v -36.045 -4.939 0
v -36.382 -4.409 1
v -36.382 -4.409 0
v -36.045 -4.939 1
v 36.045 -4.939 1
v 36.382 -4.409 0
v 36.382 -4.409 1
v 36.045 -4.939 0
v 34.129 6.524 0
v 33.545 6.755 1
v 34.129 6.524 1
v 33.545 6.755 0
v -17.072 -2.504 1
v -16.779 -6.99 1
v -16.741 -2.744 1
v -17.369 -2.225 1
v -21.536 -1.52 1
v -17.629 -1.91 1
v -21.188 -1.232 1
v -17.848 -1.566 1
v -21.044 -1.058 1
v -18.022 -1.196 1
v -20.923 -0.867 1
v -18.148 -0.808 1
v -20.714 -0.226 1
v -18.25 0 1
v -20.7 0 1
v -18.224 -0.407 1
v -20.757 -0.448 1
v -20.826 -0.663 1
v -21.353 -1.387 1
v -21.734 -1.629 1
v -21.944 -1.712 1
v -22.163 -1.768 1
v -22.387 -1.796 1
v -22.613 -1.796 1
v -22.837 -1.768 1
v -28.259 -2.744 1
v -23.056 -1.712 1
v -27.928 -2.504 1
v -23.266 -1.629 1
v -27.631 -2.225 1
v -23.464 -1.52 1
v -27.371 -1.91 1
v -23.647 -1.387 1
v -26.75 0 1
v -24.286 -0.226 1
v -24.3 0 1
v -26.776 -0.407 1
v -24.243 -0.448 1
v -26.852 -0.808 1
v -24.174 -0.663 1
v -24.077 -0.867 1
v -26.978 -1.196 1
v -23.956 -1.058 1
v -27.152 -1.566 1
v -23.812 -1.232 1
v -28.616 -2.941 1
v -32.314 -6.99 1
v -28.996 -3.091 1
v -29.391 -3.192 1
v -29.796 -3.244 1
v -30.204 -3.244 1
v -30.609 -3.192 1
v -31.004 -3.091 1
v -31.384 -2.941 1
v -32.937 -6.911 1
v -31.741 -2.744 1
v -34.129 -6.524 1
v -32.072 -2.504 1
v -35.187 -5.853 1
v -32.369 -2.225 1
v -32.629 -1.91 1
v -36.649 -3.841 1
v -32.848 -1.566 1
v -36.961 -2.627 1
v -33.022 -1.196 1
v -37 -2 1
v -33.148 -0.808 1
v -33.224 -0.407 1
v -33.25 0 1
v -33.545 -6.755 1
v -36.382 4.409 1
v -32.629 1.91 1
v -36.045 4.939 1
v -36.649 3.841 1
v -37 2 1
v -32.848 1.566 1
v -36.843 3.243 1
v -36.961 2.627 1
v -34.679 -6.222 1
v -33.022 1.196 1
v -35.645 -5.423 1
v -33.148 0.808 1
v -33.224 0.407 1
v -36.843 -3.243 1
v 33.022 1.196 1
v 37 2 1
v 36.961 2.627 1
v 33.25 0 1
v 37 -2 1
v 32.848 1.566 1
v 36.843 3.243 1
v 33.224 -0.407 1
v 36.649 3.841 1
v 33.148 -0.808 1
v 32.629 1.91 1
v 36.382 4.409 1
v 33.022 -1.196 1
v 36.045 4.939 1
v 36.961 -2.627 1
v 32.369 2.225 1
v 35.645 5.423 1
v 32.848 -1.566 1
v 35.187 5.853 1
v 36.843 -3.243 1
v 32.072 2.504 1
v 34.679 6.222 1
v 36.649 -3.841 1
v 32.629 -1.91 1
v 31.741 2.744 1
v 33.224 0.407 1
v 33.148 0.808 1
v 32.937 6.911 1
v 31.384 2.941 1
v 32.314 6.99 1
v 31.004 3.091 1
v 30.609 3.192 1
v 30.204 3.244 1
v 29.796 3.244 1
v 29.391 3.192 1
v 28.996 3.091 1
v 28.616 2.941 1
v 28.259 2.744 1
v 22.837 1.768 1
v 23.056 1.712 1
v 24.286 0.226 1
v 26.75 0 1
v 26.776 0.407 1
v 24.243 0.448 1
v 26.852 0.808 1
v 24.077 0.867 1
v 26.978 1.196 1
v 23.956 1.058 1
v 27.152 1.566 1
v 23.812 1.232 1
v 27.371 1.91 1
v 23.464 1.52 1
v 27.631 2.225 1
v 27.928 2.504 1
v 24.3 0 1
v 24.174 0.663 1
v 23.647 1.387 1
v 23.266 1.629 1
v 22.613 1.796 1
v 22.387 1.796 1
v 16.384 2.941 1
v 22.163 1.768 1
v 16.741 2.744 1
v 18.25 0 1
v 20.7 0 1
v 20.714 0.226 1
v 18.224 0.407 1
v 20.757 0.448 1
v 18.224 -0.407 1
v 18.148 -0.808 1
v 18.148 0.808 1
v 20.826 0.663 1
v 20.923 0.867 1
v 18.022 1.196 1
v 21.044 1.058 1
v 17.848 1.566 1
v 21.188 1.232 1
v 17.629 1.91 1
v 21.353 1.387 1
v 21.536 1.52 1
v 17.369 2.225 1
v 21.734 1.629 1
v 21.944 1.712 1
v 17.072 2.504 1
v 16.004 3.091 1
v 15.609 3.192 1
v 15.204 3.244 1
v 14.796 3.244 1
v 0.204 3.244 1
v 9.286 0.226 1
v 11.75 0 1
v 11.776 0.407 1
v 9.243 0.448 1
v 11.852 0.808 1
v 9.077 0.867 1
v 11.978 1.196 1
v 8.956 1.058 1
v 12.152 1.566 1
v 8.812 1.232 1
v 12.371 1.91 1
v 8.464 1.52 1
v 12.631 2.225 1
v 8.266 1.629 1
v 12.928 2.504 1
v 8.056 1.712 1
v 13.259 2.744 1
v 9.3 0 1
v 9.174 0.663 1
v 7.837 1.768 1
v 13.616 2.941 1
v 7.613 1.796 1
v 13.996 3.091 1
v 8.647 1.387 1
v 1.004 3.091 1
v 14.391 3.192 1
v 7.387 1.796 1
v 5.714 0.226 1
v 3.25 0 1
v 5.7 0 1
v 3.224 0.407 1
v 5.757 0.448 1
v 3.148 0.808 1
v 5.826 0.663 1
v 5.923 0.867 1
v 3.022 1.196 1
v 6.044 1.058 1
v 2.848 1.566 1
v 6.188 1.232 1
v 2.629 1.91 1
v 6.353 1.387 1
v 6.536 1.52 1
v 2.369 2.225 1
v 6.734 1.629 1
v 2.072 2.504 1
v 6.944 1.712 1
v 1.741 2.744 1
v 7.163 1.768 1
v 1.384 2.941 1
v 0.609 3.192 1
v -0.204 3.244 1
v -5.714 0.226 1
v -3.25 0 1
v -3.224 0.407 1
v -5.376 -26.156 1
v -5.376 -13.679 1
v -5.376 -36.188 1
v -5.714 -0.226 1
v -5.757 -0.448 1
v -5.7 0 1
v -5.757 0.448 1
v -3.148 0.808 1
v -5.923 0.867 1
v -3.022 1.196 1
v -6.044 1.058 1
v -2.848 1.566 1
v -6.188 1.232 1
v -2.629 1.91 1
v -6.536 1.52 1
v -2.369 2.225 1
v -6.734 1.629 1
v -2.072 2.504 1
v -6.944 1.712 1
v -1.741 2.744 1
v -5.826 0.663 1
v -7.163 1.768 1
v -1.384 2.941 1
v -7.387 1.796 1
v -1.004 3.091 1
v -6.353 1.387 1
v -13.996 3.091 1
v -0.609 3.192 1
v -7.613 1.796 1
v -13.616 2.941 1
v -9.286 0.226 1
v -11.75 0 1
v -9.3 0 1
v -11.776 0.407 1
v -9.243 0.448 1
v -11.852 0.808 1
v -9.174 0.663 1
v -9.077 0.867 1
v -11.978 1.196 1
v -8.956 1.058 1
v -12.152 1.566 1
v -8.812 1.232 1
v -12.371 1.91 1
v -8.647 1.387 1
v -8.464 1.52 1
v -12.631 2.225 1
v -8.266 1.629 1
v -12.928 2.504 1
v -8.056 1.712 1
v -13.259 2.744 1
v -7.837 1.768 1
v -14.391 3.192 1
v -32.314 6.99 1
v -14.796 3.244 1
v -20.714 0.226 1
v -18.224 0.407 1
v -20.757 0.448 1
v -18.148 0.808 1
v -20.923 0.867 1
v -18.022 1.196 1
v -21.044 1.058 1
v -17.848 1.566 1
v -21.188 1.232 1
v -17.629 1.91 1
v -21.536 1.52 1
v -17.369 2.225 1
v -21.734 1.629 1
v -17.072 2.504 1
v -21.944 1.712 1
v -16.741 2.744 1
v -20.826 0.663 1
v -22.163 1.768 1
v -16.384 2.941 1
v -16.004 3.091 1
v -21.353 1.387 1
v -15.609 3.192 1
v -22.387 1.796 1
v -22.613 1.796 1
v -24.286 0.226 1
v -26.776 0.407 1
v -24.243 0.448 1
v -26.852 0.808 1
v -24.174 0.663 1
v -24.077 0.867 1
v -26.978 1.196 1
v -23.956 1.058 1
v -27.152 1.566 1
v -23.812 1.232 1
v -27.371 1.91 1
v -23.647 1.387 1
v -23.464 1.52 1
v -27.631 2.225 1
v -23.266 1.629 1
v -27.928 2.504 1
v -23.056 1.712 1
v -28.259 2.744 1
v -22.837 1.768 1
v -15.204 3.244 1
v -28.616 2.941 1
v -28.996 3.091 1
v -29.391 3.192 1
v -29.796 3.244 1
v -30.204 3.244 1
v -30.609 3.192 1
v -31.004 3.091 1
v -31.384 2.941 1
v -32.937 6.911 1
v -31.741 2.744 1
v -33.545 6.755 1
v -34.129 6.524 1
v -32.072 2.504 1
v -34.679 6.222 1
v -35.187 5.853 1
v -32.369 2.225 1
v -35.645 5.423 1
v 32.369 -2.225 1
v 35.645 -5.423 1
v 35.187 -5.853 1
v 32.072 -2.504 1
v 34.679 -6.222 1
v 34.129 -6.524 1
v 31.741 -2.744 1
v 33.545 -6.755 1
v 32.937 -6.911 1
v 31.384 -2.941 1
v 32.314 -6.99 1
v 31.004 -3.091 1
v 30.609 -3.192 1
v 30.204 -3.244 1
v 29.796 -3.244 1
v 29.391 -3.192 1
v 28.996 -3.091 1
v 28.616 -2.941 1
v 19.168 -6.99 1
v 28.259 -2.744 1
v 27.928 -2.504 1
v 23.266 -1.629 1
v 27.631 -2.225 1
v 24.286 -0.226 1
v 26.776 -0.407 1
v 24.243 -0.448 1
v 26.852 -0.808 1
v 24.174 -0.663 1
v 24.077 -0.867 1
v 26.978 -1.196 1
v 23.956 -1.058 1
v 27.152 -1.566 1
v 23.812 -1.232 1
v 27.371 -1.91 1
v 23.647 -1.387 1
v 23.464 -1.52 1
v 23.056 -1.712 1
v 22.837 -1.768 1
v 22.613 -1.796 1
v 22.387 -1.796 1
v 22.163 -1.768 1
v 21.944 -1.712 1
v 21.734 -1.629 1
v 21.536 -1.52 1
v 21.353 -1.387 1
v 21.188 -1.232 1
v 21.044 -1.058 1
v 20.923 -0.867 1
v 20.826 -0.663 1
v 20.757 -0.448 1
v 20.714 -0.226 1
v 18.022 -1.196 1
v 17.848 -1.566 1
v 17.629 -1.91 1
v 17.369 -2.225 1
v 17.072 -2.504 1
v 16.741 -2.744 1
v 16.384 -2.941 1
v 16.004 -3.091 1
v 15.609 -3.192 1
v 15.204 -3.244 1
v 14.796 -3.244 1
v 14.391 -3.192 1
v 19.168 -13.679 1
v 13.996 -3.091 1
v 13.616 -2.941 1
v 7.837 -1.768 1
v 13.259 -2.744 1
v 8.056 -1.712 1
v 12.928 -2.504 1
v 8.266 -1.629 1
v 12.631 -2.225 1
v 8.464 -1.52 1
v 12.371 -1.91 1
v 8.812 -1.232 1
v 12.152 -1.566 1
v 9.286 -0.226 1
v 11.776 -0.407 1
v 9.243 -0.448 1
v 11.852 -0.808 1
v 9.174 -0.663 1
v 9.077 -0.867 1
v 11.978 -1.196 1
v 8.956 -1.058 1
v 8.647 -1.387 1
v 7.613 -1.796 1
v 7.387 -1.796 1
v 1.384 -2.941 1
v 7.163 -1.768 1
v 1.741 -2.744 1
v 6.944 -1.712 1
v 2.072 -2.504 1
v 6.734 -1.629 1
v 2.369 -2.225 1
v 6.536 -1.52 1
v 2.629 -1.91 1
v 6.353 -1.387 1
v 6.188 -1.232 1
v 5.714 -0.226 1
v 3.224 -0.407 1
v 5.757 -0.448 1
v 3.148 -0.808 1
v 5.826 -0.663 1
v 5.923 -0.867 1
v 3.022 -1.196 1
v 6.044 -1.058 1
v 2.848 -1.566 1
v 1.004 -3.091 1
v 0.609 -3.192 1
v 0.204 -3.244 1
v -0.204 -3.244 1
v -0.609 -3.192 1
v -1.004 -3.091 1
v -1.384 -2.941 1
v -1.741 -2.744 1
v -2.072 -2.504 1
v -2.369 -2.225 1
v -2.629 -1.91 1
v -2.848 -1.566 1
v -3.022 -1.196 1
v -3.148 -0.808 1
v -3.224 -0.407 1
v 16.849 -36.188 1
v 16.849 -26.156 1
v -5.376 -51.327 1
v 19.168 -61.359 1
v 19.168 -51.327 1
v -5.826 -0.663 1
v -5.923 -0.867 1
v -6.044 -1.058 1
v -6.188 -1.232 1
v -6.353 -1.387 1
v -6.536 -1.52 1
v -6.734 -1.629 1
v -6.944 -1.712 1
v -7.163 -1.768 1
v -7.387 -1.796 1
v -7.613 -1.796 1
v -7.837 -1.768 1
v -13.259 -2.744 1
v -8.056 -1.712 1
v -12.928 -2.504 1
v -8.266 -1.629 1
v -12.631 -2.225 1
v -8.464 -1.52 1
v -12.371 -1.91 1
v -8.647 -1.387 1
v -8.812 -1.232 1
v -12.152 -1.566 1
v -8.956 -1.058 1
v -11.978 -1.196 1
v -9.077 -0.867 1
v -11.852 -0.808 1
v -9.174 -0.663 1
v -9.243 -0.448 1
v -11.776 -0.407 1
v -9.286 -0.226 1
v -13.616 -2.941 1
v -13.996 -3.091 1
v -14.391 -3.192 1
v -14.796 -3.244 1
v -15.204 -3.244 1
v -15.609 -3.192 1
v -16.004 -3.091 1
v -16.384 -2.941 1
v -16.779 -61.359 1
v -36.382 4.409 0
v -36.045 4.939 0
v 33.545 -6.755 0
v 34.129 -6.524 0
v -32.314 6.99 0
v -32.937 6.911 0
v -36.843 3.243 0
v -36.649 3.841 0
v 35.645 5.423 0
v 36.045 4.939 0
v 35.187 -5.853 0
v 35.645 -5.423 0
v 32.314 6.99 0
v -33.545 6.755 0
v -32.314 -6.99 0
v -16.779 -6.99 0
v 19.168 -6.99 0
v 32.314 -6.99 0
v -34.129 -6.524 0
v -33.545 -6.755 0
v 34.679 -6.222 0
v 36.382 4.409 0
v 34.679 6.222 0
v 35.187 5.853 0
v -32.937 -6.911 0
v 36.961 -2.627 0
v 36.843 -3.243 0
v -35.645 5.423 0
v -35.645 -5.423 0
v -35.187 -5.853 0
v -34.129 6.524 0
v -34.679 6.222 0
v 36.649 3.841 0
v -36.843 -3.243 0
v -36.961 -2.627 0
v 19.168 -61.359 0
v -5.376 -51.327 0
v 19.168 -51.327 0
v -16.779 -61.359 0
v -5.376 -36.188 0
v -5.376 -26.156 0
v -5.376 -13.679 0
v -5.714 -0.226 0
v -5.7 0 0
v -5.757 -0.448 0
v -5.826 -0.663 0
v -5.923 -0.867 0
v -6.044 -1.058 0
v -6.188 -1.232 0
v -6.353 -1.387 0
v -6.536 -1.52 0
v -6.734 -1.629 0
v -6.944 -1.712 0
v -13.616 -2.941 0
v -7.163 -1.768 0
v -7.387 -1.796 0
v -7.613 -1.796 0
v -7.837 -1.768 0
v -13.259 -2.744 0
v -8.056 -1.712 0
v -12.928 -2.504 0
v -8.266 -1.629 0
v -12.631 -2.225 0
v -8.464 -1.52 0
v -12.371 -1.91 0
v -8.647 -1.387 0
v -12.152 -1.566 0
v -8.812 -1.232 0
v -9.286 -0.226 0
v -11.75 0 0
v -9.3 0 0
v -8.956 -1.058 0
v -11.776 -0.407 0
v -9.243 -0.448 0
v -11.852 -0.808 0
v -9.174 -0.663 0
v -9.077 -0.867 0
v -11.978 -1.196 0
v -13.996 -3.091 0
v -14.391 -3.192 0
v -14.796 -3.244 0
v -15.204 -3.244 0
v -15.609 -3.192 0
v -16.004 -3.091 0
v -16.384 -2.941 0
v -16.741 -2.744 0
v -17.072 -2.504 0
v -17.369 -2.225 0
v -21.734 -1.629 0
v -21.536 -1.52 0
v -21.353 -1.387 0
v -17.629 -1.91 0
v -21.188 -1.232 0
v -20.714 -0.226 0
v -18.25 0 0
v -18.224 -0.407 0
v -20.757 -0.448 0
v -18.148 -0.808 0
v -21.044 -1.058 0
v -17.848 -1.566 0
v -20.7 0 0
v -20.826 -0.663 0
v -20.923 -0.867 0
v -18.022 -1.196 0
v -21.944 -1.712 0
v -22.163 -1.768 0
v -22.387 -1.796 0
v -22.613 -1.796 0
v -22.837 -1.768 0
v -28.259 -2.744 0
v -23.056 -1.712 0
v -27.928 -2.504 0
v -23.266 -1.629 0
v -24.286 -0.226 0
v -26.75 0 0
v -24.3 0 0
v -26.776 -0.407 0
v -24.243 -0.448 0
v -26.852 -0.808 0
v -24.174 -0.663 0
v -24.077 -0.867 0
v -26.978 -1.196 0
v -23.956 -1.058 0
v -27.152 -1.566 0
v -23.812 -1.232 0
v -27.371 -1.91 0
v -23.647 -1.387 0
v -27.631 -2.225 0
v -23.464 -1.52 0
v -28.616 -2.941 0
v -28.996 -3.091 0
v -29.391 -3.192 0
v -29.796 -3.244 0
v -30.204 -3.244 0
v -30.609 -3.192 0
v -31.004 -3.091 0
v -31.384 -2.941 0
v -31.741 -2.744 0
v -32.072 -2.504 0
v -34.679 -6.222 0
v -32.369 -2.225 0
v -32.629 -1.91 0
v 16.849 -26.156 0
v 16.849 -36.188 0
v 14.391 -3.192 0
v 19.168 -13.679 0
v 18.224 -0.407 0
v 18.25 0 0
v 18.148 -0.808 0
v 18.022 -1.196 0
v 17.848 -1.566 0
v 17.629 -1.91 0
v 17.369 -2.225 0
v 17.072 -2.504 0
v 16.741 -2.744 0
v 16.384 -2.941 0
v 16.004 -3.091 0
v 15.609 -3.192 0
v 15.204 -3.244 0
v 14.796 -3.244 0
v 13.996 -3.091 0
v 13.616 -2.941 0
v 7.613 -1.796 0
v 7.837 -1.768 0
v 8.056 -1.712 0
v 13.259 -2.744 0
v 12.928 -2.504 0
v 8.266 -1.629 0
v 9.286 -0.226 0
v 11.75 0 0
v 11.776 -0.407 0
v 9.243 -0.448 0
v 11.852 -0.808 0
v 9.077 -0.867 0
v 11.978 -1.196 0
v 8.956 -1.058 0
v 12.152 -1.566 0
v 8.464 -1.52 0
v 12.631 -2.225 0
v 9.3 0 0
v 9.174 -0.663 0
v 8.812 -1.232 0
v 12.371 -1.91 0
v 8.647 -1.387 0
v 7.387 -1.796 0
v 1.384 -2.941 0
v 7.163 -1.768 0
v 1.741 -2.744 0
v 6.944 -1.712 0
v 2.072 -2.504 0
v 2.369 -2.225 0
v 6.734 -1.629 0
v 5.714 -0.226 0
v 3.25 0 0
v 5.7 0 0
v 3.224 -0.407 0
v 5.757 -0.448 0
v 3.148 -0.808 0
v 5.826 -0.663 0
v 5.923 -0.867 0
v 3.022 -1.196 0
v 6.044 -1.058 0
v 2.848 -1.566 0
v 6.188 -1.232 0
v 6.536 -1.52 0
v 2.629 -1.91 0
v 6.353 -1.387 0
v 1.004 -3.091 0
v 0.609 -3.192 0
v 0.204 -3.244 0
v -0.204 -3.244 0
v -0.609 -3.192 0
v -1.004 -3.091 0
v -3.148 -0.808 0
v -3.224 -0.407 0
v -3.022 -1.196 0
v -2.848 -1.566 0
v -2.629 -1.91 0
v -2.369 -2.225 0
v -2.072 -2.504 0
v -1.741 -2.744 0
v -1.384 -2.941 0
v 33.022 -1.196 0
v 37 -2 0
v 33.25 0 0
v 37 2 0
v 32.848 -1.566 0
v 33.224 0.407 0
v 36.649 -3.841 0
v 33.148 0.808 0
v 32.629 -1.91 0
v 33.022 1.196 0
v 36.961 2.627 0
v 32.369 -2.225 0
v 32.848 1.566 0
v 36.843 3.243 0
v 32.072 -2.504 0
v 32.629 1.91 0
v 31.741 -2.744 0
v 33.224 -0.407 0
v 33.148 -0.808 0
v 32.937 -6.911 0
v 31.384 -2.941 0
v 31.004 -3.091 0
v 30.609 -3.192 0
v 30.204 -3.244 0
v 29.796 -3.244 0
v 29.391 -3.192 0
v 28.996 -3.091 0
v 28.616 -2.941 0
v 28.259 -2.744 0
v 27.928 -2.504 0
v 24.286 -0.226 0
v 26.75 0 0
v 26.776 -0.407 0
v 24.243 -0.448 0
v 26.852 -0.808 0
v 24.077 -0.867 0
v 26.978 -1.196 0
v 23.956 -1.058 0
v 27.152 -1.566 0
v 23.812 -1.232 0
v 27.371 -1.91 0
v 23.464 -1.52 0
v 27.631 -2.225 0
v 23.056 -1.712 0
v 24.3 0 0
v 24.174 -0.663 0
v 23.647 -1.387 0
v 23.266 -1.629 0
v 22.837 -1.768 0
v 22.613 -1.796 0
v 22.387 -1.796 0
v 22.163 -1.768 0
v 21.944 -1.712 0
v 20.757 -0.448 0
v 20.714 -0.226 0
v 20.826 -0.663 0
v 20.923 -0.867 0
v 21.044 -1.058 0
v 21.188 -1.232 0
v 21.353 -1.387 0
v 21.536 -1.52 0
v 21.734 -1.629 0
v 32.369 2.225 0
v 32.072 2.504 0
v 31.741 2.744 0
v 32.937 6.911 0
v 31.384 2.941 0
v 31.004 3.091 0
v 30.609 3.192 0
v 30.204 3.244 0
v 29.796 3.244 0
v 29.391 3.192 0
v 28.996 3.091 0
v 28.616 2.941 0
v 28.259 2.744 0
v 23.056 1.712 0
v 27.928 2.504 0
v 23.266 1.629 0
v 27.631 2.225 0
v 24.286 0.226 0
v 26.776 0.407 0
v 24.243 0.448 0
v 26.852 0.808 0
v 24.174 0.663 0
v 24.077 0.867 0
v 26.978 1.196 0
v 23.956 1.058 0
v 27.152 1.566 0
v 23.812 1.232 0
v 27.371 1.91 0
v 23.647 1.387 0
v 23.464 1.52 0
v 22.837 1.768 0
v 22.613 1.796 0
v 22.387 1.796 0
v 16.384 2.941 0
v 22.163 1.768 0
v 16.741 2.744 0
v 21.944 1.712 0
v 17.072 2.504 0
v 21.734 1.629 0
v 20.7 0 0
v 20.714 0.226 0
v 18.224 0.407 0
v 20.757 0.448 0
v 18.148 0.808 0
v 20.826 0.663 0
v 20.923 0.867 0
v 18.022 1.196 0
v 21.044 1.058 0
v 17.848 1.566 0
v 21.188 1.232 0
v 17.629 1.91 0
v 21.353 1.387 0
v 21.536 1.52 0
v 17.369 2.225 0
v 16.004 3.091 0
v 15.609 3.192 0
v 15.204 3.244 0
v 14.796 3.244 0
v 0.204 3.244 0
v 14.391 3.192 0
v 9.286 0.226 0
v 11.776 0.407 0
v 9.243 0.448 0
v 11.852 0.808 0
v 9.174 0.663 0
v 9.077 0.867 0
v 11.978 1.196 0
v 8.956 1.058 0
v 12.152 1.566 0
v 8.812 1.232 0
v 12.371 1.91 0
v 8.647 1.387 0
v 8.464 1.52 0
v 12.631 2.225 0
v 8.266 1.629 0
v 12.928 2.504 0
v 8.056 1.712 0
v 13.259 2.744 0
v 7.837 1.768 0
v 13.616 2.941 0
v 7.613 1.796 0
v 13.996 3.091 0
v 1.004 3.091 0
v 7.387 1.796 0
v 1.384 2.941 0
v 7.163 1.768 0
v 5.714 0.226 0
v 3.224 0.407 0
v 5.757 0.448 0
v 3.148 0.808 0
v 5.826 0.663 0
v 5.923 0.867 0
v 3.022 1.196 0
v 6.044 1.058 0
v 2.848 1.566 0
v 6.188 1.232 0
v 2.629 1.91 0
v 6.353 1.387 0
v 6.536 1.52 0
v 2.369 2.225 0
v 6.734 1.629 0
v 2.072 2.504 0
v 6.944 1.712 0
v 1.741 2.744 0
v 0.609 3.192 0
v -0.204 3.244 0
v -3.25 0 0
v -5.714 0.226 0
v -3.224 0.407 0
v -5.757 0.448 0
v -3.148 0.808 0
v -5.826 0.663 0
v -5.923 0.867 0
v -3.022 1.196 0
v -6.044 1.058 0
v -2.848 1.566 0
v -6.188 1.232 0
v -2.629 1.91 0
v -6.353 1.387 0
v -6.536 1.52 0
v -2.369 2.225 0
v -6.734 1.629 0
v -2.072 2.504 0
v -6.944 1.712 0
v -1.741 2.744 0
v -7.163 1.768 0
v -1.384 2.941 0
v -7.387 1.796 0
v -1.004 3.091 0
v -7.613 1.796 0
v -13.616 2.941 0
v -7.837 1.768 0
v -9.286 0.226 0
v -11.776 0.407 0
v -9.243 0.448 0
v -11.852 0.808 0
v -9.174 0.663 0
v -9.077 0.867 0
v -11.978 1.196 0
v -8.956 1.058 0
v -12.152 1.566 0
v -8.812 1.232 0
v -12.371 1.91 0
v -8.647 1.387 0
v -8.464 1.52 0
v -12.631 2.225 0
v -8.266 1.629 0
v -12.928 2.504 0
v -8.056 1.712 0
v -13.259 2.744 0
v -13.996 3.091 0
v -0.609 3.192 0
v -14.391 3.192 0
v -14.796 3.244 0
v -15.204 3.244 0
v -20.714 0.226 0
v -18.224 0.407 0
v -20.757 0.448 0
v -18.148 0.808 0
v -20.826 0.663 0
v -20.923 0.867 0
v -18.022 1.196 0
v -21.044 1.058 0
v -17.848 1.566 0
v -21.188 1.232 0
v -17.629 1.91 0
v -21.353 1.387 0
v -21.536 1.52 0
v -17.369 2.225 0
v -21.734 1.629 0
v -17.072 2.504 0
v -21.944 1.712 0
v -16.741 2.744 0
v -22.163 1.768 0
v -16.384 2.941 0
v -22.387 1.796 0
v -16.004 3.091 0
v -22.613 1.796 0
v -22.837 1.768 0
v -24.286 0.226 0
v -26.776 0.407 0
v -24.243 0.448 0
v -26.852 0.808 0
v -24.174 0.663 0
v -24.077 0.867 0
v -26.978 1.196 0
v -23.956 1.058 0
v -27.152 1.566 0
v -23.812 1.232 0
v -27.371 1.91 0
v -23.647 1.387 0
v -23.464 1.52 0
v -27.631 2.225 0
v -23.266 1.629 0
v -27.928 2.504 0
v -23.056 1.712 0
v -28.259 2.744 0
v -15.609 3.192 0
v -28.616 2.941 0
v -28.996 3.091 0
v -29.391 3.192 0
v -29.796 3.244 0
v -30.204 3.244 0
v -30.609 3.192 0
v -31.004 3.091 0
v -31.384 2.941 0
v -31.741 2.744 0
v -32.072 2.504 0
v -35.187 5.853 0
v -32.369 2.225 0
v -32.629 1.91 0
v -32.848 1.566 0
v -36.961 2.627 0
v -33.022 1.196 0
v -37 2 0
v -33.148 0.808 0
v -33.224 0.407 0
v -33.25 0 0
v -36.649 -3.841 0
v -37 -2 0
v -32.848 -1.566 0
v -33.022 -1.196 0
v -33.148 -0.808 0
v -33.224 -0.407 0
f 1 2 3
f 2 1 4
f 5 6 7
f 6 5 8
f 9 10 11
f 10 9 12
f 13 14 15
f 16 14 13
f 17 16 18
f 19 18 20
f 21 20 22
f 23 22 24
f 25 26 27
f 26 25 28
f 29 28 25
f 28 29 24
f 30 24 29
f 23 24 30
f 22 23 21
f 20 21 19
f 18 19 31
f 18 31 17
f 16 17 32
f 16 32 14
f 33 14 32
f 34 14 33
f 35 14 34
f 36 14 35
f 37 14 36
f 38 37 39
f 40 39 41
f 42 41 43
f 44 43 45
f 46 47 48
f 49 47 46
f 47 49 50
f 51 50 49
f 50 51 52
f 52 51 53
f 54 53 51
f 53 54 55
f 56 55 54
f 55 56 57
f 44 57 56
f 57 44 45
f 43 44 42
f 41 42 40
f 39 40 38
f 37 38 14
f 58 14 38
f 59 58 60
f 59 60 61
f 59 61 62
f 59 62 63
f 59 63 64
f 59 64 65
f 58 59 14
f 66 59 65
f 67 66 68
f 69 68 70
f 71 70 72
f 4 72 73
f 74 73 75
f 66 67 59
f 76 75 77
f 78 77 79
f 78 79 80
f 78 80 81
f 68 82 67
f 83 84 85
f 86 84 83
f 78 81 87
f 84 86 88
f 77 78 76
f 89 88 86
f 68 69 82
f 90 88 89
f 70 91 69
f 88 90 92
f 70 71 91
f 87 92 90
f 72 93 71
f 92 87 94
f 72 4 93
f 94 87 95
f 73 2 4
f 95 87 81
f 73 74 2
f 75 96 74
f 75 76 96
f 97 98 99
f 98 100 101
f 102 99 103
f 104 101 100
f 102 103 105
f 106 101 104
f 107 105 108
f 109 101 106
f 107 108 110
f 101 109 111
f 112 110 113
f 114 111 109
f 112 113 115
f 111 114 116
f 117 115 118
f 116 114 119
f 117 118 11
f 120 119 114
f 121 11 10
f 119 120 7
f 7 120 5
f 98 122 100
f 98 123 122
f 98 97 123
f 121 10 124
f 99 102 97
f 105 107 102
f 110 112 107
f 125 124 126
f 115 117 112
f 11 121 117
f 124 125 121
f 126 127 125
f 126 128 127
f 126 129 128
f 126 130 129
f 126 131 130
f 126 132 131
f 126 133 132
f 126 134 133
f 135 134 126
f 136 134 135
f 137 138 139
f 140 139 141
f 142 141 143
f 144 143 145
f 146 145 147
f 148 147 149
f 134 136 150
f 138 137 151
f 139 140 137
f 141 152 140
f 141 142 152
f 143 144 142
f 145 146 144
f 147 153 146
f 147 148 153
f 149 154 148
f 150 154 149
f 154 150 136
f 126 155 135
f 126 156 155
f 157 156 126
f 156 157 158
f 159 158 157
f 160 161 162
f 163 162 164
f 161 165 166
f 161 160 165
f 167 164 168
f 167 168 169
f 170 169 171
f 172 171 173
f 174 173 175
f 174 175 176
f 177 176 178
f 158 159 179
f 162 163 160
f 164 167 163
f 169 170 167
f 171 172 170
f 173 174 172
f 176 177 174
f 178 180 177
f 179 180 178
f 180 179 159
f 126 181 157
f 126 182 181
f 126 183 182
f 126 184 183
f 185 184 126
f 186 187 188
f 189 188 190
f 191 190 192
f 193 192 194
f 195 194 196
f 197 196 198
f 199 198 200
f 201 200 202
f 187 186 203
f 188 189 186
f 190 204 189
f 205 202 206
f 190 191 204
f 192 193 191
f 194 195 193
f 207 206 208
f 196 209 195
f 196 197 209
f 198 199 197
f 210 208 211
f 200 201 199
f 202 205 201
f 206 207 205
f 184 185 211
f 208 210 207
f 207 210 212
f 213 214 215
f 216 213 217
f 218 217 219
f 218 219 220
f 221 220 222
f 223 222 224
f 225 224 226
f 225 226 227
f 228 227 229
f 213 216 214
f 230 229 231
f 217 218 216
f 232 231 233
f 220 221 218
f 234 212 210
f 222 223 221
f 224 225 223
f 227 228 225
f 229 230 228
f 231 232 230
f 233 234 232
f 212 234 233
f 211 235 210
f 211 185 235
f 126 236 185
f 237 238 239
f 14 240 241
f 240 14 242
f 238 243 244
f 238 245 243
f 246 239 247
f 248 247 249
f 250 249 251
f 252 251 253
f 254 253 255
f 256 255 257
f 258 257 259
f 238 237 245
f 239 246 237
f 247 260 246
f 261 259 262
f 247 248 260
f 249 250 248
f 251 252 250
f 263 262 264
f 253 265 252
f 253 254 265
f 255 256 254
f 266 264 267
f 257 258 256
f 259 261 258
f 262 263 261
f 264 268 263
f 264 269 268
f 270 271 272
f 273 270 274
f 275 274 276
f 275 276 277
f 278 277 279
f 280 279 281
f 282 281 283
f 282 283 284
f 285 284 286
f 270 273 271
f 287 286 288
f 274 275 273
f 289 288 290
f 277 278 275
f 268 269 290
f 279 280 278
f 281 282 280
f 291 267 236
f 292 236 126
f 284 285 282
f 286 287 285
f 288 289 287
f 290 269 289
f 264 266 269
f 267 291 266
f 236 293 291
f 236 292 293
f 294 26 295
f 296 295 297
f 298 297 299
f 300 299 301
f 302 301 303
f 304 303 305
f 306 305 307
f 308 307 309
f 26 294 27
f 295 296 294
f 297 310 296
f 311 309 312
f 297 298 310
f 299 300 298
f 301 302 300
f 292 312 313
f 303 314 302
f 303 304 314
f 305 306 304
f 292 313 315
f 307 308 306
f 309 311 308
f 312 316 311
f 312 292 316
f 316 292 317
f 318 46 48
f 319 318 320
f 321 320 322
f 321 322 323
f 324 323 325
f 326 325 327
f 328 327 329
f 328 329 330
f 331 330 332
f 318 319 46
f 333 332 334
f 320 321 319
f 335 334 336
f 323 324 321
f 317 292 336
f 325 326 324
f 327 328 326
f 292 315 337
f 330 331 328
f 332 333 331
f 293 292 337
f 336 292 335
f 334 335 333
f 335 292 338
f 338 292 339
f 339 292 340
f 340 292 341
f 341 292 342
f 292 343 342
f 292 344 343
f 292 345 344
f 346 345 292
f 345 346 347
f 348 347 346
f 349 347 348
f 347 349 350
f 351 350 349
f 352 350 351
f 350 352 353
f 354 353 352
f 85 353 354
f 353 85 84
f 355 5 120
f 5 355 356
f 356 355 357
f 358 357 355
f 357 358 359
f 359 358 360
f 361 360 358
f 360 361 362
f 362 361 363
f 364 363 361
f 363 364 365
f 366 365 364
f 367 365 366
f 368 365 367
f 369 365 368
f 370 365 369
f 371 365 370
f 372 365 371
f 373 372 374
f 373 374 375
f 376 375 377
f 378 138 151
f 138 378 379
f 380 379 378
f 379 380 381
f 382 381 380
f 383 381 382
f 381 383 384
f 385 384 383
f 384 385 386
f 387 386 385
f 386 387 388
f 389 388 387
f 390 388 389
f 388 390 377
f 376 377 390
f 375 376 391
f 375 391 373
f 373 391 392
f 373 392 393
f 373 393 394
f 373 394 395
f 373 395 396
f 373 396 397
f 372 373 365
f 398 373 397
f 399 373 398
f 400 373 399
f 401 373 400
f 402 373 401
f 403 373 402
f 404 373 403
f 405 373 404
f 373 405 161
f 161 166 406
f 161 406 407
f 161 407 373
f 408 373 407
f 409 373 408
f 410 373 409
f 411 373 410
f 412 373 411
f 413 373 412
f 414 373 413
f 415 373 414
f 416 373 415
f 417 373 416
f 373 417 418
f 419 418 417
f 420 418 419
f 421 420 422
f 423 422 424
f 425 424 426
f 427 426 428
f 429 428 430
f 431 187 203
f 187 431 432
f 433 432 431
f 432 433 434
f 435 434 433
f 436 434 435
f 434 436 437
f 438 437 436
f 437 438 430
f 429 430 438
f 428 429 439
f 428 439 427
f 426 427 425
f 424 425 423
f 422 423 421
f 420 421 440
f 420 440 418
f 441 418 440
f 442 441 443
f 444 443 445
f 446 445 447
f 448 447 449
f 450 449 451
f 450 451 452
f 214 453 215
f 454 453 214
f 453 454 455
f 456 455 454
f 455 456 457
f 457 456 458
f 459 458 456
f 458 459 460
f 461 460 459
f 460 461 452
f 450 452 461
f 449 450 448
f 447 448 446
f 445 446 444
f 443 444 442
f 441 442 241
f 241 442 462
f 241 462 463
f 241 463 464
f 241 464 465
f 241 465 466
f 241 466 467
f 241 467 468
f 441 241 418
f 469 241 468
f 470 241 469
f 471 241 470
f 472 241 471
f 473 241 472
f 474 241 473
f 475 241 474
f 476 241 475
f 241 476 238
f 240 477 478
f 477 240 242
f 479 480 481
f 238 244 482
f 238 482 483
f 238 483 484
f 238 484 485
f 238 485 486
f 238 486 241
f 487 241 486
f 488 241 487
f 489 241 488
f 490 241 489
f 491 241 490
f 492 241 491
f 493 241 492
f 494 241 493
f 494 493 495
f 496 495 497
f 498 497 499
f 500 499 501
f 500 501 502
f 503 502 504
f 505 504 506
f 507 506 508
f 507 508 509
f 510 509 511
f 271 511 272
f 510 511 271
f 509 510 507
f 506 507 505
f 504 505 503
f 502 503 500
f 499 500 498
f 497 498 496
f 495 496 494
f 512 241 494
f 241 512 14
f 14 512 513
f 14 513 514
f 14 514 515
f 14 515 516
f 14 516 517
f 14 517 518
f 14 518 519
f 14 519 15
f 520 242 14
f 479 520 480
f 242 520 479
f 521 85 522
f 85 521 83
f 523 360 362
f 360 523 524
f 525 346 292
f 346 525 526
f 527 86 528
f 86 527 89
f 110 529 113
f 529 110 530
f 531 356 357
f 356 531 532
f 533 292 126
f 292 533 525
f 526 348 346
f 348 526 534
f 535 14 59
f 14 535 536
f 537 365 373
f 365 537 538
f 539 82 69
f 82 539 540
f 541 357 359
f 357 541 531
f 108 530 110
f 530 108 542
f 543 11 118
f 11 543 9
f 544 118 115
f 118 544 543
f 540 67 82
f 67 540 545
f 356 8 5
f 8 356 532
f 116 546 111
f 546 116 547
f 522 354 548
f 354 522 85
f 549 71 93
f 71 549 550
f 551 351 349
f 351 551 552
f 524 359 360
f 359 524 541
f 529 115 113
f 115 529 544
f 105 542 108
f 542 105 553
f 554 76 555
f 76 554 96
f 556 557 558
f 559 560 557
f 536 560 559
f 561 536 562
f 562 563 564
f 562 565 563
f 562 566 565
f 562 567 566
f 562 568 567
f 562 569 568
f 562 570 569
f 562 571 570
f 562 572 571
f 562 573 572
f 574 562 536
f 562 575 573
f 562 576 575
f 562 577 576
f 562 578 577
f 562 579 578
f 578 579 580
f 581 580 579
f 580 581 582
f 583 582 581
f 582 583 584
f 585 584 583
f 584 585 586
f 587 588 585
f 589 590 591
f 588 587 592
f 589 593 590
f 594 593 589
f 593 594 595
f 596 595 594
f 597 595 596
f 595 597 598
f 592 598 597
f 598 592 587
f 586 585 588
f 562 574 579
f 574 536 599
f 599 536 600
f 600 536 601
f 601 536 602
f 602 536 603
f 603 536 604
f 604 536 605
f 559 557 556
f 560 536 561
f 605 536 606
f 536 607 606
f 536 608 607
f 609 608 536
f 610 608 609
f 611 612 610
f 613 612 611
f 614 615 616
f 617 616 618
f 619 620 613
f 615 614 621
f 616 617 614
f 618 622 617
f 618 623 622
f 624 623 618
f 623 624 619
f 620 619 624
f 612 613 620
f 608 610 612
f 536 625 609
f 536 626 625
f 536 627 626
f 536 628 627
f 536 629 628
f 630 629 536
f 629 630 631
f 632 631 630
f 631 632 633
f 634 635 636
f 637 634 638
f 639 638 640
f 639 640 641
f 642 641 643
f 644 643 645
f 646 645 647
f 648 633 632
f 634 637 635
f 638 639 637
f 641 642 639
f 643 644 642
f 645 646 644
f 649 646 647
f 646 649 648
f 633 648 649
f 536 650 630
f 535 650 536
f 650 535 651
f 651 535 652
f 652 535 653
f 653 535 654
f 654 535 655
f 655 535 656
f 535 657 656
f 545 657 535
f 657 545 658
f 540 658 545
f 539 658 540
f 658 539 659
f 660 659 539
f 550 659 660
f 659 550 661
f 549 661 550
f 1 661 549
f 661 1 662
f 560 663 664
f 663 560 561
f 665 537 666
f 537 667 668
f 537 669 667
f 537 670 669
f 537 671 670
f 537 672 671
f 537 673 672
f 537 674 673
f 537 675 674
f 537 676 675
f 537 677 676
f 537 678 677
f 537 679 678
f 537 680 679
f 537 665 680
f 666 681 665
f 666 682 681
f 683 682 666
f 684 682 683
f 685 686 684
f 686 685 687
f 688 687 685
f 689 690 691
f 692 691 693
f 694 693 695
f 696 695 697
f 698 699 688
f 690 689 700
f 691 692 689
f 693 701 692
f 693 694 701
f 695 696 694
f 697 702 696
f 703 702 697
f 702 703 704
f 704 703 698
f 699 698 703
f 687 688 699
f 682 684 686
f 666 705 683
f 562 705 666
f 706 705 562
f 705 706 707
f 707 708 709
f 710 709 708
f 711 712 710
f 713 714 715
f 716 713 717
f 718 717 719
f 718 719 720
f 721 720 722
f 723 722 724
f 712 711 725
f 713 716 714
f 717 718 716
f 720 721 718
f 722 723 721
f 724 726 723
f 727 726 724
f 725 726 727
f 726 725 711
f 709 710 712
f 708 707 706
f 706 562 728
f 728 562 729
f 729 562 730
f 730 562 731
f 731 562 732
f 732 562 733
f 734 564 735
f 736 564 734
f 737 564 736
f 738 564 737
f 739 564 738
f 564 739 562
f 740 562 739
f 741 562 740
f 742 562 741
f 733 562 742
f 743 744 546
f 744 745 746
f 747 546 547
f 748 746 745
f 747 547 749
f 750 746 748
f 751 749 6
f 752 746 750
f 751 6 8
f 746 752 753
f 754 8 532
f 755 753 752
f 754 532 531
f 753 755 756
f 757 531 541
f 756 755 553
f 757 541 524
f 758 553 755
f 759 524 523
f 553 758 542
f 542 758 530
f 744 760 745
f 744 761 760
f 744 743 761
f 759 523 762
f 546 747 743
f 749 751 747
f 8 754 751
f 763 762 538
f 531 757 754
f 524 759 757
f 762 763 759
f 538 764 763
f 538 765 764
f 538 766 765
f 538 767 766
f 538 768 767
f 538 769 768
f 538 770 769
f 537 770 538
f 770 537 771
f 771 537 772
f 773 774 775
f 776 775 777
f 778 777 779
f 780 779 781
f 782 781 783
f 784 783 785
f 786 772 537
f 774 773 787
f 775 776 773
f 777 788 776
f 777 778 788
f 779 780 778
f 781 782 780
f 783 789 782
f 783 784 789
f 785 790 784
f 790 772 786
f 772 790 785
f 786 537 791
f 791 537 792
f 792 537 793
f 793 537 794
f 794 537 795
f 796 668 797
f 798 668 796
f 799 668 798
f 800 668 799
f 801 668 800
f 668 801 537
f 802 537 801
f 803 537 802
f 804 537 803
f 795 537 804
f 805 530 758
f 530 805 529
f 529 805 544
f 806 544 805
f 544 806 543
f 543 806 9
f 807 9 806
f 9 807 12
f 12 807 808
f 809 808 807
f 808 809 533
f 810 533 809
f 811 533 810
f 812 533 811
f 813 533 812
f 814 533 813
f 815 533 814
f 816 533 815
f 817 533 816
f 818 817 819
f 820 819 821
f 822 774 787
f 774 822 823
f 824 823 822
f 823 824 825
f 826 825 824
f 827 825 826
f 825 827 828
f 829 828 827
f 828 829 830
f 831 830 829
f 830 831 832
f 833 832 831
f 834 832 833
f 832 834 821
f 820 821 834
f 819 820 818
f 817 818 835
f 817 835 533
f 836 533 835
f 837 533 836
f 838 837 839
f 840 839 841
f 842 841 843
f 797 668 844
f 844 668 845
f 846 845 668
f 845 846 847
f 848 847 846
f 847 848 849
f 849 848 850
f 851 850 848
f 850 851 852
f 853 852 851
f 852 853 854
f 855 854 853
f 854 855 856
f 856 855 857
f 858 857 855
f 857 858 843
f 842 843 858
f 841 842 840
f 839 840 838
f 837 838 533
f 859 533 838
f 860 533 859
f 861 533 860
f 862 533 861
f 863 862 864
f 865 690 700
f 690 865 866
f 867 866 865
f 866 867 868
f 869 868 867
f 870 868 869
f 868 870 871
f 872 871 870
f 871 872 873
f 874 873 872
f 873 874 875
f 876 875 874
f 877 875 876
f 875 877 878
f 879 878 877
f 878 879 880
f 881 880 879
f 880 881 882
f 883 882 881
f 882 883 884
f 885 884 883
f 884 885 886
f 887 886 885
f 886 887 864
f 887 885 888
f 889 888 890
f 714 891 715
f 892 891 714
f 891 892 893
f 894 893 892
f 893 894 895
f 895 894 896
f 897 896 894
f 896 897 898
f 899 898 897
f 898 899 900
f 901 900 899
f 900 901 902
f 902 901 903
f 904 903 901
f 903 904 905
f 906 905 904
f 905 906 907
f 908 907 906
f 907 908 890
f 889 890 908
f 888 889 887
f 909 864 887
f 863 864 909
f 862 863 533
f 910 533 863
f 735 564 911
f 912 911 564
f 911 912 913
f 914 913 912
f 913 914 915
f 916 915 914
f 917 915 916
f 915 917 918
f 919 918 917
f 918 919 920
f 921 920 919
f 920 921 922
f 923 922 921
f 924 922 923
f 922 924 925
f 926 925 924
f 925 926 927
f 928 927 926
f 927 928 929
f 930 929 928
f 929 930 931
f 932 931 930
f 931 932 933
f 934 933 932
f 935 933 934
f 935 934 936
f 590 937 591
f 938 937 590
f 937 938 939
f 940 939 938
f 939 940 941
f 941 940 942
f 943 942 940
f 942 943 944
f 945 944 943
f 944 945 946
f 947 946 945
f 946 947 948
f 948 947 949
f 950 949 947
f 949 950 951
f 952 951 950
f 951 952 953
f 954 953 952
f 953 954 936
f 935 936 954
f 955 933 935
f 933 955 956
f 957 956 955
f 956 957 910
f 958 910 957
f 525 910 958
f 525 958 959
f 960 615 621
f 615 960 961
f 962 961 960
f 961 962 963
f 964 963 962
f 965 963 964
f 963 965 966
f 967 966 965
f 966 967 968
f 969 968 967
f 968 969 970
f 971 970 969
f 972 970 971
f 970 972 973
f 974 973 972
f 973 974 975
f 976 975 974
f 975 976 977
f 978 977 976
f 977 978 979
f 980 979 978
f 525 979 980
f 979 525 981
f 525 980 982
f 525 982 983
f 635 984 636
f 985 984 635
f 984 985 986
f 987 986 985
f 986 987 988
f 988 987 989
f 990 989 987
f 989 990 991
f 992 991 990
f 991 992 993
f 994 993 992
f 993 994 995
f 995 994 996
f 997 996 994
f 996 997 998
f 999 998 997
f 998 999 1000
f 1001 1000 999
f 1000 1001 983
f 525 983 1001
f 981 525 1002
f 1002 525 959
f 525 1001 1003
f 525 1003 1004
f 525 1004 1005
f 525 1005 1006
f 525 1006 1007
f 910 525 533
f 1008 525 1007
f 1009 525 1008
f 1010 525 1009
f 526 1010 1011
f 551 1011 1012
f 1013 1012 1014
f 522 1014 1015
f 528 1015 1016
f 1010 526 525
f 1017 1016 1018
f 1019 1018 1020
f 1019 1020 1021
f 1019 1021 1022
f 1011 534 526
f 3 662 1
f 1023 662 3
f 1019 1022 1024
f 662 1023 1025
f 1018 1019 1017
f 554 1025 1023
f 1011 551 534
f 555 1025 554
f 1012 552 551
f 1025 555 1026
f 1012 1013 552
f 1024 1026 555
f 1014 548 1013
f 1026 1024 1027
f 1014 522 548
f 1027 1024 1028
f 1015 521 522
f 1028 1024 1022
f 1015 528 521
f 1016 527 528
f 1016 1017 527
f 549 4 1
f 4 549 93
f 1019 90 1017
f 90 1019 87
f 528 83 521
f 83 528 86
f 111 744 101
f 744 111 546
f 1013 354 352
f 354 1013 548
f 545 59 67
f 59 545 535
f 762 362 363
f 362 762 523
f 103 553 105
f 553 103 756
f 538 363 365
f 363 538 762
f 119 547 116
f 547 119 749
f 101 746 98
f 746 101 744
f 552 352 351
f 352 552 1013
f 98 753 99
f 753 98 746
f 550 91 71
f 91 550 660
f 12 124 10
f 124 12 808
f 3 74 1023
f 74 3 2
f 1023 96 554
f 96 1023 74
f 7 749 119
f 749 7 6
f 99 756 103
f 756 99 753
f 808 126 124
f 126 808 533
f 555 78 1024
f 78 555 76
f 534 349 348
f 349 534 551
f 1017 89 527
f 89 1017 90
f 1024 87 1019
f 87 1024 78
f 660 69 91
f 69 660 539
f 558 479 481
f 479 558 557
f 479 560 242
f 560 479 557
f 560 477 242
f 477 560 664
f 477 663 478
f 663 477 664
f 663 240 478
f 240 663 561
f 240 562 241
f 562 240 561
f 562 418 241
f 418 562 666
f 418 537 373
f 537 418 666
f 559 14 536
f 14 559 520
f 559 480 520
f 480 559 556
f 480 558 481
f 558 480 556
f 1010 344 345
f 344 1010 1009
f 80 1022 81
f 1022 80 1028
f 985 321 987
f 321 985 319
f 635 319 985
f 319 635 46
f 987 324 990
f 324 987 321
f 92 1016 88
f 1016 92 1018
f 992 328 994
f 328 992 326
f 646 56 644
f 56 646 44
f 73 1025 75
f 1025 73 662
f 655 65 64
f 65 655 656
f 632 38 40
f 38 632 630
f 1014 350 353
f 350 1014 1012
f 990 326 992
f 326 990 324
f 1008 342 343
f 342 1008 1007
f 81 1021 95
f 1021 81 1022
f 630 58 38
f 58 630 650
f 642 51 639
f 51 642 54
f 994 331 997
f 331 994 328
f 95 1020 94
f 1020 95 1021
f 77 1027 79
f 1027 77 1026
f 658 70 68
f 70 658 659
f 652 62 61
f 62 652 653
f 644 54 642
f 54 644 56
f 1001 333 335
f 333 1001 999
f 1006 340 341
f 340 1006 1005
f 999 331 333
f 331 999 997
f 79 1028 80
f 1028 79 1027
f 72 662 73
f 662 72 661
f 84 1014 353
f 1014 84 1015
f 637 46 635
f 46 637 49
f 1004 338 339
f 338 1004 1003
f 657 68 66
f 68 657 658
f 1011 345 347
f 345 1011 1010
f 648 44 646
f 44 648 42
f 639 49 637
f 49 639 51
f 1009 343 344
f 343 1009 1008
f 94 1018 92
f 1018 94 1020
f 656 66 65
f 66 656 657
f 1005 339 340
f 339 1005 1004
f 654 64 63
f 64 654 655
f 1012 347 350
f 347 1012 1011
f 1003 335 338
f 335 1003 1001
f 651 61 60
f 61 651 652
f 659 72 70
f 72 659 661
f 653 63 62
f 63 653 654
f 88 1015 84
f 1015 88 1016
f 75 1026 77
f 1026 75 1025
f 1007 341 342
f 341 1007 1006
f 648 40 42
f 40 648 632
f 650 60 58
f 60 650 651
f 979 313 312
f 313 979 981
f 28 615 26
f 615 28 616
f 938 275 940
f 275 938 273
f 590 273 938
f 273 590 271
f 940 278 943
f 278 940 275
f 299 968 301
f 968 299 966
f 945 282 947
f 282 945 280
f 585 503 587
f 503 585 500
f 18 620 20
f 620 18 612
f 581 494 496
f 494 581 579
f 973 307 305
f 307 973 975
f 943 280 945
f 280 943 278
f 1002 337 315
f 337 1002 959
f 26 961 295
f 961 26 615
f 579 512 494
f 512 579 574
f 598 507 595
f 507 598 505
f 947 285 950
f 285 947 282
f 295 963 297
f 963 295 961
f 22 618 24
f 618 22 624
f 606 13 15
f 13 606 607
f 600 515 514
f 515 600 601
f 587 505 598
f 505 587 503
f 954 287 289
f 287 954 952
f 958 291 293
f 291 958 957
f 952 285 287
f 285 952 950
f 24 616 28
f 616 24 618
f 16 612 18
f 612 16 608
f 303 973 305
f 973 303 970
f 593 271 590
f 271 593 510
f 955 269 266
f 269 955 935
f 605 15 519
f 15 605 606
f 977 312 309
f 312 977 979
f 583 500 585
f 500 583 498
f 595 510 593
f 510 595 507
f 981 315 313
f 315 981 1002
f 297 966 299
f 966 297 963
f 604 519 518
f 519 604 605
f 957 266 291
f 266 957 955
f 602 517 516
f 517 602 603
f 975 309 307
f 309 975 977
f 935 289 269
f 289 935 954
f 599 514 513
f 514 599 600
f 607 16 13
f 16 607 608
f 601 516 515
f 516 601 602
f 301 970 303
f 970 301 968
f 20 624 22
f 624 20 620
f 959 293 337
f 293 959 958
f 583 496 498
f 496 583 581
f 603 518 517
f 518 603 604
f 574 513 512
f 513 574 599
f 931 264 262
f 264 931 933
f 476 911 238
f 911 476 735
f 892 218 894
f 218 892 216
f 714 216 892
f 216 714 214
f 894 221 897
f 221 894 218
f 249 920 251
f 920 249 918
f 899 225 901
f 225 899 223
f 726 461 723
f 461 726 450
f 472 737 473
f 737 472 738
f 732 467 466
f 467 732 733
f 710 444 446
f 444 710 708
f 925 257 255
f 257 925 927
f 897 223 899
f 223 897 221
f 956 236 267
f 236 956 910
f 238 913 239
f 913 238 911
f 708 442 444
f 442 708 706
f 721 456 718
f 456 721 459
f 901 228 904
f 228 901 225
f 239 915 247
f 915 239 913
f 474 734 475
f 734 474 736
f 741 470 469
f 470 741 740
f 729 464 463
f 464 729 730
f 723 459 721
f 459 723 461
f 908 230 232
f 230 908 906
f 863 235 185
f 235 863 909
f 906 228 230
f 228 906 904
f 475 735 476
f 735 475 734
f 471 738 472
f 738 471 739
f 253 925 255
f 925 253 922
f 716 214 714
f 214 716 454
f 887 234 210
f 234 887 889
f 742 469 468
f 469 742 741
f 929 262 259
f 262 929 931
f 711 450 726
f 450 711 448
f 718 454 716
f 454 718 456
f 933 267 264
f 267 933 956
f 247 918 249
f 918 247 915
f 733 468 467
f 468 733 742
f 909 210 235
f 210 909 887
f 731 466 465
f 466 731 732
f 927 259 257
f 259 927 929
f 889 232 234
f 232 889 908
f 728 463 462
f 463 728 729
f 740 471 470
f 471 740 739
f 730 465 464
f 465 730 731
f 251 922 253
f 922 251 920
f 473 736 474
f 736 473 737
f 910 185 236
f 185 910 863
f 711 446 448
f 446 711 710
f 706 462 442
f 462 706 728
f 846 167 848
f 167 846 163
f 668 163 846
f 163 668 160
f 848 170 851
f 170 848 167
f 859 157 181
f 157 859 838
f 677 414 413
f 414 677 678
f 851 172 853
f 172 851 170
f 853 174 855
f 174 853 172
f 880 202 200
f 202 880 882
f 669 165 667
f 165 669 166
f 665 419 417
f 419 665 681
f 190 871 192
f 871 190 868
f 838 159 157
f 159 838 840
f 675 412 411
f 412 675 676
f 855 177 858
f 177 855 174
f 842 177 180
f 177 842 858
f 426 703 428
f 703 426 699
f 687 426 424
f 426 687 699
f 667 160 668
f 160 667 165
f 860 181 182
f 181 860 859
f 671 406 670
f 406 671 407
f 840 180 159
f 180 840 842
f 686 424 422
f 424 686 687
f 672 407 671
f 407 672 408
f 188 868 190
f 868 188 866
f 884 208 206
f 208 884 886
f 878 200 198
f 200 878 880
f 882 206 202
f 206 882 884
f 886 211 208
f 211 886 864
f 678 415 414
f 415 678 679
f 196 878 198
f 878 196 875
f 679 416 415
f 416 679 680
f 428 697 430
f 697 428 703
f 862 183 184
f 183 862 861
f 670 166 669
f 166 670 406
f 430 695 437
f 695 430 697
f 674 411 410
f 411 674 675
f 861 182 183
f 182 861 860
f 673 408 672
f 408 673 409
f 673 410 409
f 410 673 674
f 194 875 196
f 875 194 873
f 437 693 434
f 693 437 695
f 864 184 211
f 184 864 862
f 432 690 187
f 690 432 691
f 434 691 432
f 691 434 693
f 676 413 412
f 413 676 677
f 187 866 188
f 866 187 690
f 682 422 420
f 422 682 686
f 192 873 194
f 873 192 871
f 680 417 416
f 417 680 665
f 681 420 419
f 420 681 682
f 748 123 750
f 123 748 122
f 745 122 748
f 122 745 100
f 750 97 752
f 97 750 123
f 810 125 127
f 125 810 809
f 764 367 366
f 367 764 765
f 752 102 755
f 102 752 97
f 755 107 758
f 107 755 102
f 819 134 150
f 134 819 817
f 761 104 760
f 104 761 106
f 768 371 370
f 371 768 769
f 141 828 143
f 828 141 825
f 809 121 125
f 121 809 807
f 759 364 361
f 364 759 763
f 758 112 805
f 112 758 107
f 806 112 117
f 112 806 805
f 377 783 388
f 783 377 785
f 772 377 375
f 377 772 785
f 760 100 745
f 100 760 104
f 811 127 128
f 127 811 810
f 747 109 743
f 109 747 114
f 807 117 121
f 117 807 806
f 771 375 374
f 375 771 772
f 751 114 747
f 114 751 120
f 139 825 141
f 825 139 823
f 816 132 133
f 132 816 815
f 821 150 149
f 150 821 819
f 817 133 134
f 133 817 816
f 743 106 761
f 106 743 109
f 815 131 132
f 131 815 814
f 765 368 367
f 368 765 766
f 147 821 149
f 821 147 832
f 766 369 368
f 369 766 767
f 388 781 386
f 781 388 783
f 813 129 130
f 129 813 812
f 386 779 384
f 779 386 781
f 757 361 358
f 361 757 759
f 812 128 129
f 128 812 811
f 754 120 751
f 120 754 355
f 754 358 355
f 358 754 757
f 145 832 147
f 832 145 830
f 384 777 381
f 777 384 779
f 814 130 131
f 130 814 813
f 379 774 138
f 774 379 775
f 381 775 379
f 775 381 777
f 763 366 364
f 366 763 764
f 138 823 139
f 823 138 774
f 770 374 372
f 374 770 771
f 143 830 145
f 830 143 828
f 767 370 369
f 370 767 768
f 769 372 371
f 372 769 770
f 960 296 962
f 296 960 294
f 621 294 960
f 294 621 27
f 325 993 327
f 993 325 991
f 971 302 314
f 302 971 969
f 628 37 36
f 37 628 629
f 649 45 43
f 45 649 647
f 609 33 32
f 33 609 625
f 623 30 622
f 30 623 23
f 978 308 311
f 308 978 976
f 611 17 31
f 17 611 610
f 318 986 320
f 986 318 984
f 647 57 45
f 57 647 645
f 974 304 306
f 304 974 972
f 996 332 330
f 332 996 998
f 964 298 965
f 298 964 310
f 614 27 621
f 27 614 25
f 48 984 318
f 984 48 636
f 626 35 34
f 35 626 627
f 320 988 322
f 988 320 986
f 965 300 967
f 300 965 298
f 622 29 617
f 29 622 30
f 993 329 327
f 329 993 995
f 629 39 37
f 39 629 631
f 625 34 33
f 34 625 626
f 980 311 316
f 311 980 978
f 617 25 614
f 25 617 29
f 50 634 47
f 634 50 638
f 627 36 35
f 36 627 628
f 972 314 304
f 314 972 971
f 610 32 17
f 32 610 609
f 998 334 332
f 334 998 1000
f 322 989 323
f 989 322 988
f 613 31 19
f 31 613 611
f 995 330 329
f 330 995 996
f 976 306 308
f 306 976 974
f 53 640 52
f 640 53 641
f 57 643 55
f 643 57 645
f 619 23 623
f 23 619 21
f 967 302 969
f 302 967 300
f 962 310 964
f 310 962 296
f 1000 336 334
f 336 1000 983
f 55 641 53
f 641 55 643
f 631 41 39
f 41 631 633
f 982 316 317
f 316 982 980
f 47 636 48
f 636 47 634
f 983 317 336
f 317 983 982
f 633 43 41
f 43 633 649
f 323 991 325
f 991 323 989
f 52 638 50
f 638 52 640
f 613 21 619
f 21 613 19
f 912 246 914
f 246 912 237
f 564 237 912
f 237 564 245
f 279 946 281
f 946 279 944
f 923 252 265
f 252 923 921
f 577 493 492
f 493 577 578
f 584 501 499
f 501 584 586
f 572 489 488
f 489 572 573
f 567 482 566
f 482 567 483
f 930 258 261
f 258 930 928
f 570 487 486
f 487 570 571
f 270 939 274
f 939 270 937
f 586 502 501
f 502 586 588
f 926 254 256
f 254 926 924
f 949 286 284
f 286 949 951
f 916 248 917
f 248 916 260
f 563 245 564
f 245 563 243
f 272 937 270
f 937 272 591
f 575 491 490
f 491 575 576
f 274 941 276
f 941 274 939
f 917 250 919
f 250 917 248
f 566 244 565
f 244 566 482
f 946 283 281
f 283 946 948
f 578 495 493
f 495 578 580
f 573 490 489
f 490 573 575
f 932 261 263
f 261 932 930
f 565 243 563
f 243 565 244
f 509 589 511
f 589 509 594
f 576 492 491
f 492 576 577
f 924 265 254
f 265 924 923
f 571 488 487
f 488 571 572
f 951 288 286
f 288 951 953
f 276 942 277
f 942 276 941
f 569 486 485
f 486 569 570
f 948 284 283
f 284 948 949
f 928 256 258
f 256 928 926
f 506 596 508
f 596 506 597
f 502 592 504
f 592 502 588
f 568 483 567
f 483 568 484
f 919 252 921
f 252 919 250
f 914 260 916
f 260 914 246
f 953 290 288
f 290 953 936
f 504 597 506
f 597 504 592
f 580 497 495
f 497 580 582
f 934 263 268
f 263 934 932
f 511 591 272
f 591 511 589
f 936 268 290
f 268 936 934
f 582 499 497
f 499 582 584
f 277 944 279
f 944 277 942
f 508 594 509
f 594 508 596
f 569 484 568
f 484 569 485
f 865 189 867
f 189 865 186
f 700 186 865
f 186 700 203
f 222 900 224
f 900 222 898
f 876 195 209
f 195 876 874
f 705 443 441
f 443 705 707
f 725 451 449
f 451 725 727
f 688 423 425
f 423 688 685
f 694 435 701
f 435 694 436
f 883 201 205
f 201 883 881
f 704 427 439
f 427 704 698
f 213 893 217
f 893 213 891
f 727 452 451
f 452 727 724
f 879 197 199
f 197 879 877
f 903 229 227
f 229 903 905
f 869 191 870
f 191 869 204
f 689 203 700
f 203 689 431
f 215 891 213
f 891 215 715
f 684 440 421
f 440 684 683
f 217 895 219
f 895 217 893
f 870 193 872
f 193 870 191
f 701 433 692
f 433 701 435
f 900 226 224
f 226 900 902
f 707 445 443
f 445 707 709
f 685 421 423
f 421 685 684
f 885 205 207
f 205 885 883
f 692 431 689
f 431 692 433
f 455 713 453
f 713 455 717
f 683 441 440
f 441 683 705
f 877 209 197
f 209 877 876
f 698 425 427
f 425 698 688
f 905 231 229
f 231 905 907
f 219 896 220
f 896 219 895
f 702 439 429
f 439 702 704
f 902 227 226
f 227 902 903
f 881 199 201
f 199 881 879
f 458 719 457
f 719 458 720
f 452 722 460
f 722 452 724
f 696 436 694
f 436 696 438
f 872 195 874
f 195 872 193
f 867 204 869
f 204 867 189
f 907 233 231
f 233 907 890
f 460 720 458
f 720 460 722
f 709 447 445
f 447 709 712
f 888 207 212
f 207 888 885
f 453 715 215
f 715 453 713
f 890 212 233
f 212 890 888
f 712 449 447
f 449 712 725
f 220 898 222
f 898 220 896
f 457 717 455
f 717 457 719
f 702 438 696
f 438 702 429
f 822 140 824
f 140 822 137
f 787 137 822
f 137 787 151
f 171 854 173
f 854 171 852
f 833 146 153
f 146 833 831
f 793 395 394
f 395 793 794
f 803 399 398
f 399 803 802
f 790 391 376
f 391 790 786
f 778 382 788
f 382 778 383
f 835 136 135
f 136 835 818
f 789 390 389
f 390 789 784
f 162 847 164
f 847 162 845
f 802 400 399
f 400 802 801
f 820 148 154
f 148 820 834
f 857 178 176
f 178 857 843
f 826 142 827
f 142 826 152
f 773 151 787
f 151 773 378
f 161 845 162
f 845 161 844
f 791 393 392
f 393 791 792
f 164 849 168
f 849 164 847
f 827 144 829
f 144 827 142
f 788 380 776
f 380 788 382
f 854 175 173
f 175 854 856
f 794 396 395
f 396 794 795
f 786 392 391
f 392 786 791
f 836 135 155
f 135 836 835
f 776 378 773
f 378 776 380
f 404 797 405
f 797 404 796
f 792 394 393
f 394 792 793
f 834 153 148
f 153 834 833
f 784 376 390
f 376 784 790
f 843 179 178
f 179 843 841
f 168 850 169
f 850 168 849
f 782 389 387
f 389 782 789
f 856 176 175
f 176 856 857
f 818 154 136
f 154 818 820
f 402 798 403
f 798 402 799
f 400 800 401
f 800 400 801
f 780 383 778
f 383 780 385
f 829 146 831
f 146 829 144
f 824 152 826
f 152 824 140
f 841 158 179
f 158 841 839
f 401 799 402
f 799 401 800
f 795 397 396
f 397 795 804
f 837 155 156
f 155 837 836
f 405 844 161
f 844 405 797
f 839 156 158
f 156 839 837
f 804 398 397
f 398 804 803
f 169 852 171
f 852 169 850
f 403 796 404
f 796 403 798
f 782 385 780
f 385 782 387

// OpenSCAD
$fn = 50;


difference() {
	union() {
		hull() {
			translate(v = [-32.0000000000, 2.0000000000, 0]) {
				cylinder(h = 1, r = 5);
			}
			translate(v = [32.0000000000, 2.0000000000, 0]) {
				cylinder(h = 1, r = 5);
			}
			translate(v = [-32.0000000000, -2.0000000000, 0]) {
				cylinder(h = 1, r = 5);
			}
			translate(v = [32.0000000000, -2.0000000000, 0]) {
				cylinder(h = 1, r = 5);
			}
		}
		translate(v = [0, -5, 0]) {
			linear_extrude(height = 1) {
				text(font = "DejaVu Sans Mono:style=Bold", halign = "center", size = 57.0000000000, text = "E", valign = "top");
			}
		}
	}
	union() {
		translate(v = [-30.0000000000, 0.0000000000, 0]) {
			translate(v = [0, 0, -100]) {
				cylinder(h = 200, r = 3.2500000000);
			}
		}
		translate(v = [-15.0000000000, 0.0000000000, 0]) {
			translate(v = [0, 0, -100]) {
				cylinder(h = 200, r = 3.2500000000);
			}
		}
		translate(v = [0, 0, -100]) {
			cylinder(h = 200, r = 3.2500000000);
		}
		translate(v = [15.0000000000, 0.0000000000, 0]) {
			translate(v = [0, 0, -100]) {
				cylinder(h = 200, r = 3.2500000000);
			}
		}
		translate(v = [30.0000000000, 0.0000000000, 0]) {
			translate(v = [0, 0, -100]) {
				cylinder(h = 200, r = 3.2500000000);
			}
		}
		translate(v = [-30.0000000000, 0.0000000000, 0]) {
			translate(v = [0, 0, -100]) {
				cylinder(h = 200, r = 1.8000000000);
			}
		}
		translate(v = [-22.5000000000, 0.0000000000, 0]) {
			translate(v = [0, 0, -100]) {
				cylinder(h = 200, r = 1.8000000000);
			}
		}
		translate(v = [-15.0000000000, 0.0000000000, 0]) {
			translate(v = [0, 0, -100]) {
				cylinder(h = 200, r = 1.8000000000);
			}
		}
		translate(v = [-7.5000000000, 0.0000000000, 0]) {
			translate(v = [0, 0, -100]) {
				cylinder(h = 200, r = 1.8000000000);
			}
		}
		translate(v = [0, 0, -100]) {
			cylinder(h = 200, r = 1.8000000000);
		}
		translate(v = [7.5000000000, 0.0000000000, 0]) {
			translate(v = [0, 0, -100]) {
				cylinder(h = 200, r = 1.8000000000);
			}
		}
		translate(v = [15.0000000000, 0.0000000000, 0]) {
			translate(v = [0, 0, -100]) {
				cylinder(h = 200, r = 1.8000000000);
			}
		}
		translate(v = [22.5000000000, 0.0000000000, 0]) {
			translate(v = [0, 0, -100]) {
				cylinder(h = 200, r = 1.8000000000);
			}
		}
		translate(v = [30.0000000000, 0.0000000000, 0]) {
			translate(v = [0, 0, -100]) {
				cylinder(h = 200, r = 1.8000000000);
			}
		}
	}
}
